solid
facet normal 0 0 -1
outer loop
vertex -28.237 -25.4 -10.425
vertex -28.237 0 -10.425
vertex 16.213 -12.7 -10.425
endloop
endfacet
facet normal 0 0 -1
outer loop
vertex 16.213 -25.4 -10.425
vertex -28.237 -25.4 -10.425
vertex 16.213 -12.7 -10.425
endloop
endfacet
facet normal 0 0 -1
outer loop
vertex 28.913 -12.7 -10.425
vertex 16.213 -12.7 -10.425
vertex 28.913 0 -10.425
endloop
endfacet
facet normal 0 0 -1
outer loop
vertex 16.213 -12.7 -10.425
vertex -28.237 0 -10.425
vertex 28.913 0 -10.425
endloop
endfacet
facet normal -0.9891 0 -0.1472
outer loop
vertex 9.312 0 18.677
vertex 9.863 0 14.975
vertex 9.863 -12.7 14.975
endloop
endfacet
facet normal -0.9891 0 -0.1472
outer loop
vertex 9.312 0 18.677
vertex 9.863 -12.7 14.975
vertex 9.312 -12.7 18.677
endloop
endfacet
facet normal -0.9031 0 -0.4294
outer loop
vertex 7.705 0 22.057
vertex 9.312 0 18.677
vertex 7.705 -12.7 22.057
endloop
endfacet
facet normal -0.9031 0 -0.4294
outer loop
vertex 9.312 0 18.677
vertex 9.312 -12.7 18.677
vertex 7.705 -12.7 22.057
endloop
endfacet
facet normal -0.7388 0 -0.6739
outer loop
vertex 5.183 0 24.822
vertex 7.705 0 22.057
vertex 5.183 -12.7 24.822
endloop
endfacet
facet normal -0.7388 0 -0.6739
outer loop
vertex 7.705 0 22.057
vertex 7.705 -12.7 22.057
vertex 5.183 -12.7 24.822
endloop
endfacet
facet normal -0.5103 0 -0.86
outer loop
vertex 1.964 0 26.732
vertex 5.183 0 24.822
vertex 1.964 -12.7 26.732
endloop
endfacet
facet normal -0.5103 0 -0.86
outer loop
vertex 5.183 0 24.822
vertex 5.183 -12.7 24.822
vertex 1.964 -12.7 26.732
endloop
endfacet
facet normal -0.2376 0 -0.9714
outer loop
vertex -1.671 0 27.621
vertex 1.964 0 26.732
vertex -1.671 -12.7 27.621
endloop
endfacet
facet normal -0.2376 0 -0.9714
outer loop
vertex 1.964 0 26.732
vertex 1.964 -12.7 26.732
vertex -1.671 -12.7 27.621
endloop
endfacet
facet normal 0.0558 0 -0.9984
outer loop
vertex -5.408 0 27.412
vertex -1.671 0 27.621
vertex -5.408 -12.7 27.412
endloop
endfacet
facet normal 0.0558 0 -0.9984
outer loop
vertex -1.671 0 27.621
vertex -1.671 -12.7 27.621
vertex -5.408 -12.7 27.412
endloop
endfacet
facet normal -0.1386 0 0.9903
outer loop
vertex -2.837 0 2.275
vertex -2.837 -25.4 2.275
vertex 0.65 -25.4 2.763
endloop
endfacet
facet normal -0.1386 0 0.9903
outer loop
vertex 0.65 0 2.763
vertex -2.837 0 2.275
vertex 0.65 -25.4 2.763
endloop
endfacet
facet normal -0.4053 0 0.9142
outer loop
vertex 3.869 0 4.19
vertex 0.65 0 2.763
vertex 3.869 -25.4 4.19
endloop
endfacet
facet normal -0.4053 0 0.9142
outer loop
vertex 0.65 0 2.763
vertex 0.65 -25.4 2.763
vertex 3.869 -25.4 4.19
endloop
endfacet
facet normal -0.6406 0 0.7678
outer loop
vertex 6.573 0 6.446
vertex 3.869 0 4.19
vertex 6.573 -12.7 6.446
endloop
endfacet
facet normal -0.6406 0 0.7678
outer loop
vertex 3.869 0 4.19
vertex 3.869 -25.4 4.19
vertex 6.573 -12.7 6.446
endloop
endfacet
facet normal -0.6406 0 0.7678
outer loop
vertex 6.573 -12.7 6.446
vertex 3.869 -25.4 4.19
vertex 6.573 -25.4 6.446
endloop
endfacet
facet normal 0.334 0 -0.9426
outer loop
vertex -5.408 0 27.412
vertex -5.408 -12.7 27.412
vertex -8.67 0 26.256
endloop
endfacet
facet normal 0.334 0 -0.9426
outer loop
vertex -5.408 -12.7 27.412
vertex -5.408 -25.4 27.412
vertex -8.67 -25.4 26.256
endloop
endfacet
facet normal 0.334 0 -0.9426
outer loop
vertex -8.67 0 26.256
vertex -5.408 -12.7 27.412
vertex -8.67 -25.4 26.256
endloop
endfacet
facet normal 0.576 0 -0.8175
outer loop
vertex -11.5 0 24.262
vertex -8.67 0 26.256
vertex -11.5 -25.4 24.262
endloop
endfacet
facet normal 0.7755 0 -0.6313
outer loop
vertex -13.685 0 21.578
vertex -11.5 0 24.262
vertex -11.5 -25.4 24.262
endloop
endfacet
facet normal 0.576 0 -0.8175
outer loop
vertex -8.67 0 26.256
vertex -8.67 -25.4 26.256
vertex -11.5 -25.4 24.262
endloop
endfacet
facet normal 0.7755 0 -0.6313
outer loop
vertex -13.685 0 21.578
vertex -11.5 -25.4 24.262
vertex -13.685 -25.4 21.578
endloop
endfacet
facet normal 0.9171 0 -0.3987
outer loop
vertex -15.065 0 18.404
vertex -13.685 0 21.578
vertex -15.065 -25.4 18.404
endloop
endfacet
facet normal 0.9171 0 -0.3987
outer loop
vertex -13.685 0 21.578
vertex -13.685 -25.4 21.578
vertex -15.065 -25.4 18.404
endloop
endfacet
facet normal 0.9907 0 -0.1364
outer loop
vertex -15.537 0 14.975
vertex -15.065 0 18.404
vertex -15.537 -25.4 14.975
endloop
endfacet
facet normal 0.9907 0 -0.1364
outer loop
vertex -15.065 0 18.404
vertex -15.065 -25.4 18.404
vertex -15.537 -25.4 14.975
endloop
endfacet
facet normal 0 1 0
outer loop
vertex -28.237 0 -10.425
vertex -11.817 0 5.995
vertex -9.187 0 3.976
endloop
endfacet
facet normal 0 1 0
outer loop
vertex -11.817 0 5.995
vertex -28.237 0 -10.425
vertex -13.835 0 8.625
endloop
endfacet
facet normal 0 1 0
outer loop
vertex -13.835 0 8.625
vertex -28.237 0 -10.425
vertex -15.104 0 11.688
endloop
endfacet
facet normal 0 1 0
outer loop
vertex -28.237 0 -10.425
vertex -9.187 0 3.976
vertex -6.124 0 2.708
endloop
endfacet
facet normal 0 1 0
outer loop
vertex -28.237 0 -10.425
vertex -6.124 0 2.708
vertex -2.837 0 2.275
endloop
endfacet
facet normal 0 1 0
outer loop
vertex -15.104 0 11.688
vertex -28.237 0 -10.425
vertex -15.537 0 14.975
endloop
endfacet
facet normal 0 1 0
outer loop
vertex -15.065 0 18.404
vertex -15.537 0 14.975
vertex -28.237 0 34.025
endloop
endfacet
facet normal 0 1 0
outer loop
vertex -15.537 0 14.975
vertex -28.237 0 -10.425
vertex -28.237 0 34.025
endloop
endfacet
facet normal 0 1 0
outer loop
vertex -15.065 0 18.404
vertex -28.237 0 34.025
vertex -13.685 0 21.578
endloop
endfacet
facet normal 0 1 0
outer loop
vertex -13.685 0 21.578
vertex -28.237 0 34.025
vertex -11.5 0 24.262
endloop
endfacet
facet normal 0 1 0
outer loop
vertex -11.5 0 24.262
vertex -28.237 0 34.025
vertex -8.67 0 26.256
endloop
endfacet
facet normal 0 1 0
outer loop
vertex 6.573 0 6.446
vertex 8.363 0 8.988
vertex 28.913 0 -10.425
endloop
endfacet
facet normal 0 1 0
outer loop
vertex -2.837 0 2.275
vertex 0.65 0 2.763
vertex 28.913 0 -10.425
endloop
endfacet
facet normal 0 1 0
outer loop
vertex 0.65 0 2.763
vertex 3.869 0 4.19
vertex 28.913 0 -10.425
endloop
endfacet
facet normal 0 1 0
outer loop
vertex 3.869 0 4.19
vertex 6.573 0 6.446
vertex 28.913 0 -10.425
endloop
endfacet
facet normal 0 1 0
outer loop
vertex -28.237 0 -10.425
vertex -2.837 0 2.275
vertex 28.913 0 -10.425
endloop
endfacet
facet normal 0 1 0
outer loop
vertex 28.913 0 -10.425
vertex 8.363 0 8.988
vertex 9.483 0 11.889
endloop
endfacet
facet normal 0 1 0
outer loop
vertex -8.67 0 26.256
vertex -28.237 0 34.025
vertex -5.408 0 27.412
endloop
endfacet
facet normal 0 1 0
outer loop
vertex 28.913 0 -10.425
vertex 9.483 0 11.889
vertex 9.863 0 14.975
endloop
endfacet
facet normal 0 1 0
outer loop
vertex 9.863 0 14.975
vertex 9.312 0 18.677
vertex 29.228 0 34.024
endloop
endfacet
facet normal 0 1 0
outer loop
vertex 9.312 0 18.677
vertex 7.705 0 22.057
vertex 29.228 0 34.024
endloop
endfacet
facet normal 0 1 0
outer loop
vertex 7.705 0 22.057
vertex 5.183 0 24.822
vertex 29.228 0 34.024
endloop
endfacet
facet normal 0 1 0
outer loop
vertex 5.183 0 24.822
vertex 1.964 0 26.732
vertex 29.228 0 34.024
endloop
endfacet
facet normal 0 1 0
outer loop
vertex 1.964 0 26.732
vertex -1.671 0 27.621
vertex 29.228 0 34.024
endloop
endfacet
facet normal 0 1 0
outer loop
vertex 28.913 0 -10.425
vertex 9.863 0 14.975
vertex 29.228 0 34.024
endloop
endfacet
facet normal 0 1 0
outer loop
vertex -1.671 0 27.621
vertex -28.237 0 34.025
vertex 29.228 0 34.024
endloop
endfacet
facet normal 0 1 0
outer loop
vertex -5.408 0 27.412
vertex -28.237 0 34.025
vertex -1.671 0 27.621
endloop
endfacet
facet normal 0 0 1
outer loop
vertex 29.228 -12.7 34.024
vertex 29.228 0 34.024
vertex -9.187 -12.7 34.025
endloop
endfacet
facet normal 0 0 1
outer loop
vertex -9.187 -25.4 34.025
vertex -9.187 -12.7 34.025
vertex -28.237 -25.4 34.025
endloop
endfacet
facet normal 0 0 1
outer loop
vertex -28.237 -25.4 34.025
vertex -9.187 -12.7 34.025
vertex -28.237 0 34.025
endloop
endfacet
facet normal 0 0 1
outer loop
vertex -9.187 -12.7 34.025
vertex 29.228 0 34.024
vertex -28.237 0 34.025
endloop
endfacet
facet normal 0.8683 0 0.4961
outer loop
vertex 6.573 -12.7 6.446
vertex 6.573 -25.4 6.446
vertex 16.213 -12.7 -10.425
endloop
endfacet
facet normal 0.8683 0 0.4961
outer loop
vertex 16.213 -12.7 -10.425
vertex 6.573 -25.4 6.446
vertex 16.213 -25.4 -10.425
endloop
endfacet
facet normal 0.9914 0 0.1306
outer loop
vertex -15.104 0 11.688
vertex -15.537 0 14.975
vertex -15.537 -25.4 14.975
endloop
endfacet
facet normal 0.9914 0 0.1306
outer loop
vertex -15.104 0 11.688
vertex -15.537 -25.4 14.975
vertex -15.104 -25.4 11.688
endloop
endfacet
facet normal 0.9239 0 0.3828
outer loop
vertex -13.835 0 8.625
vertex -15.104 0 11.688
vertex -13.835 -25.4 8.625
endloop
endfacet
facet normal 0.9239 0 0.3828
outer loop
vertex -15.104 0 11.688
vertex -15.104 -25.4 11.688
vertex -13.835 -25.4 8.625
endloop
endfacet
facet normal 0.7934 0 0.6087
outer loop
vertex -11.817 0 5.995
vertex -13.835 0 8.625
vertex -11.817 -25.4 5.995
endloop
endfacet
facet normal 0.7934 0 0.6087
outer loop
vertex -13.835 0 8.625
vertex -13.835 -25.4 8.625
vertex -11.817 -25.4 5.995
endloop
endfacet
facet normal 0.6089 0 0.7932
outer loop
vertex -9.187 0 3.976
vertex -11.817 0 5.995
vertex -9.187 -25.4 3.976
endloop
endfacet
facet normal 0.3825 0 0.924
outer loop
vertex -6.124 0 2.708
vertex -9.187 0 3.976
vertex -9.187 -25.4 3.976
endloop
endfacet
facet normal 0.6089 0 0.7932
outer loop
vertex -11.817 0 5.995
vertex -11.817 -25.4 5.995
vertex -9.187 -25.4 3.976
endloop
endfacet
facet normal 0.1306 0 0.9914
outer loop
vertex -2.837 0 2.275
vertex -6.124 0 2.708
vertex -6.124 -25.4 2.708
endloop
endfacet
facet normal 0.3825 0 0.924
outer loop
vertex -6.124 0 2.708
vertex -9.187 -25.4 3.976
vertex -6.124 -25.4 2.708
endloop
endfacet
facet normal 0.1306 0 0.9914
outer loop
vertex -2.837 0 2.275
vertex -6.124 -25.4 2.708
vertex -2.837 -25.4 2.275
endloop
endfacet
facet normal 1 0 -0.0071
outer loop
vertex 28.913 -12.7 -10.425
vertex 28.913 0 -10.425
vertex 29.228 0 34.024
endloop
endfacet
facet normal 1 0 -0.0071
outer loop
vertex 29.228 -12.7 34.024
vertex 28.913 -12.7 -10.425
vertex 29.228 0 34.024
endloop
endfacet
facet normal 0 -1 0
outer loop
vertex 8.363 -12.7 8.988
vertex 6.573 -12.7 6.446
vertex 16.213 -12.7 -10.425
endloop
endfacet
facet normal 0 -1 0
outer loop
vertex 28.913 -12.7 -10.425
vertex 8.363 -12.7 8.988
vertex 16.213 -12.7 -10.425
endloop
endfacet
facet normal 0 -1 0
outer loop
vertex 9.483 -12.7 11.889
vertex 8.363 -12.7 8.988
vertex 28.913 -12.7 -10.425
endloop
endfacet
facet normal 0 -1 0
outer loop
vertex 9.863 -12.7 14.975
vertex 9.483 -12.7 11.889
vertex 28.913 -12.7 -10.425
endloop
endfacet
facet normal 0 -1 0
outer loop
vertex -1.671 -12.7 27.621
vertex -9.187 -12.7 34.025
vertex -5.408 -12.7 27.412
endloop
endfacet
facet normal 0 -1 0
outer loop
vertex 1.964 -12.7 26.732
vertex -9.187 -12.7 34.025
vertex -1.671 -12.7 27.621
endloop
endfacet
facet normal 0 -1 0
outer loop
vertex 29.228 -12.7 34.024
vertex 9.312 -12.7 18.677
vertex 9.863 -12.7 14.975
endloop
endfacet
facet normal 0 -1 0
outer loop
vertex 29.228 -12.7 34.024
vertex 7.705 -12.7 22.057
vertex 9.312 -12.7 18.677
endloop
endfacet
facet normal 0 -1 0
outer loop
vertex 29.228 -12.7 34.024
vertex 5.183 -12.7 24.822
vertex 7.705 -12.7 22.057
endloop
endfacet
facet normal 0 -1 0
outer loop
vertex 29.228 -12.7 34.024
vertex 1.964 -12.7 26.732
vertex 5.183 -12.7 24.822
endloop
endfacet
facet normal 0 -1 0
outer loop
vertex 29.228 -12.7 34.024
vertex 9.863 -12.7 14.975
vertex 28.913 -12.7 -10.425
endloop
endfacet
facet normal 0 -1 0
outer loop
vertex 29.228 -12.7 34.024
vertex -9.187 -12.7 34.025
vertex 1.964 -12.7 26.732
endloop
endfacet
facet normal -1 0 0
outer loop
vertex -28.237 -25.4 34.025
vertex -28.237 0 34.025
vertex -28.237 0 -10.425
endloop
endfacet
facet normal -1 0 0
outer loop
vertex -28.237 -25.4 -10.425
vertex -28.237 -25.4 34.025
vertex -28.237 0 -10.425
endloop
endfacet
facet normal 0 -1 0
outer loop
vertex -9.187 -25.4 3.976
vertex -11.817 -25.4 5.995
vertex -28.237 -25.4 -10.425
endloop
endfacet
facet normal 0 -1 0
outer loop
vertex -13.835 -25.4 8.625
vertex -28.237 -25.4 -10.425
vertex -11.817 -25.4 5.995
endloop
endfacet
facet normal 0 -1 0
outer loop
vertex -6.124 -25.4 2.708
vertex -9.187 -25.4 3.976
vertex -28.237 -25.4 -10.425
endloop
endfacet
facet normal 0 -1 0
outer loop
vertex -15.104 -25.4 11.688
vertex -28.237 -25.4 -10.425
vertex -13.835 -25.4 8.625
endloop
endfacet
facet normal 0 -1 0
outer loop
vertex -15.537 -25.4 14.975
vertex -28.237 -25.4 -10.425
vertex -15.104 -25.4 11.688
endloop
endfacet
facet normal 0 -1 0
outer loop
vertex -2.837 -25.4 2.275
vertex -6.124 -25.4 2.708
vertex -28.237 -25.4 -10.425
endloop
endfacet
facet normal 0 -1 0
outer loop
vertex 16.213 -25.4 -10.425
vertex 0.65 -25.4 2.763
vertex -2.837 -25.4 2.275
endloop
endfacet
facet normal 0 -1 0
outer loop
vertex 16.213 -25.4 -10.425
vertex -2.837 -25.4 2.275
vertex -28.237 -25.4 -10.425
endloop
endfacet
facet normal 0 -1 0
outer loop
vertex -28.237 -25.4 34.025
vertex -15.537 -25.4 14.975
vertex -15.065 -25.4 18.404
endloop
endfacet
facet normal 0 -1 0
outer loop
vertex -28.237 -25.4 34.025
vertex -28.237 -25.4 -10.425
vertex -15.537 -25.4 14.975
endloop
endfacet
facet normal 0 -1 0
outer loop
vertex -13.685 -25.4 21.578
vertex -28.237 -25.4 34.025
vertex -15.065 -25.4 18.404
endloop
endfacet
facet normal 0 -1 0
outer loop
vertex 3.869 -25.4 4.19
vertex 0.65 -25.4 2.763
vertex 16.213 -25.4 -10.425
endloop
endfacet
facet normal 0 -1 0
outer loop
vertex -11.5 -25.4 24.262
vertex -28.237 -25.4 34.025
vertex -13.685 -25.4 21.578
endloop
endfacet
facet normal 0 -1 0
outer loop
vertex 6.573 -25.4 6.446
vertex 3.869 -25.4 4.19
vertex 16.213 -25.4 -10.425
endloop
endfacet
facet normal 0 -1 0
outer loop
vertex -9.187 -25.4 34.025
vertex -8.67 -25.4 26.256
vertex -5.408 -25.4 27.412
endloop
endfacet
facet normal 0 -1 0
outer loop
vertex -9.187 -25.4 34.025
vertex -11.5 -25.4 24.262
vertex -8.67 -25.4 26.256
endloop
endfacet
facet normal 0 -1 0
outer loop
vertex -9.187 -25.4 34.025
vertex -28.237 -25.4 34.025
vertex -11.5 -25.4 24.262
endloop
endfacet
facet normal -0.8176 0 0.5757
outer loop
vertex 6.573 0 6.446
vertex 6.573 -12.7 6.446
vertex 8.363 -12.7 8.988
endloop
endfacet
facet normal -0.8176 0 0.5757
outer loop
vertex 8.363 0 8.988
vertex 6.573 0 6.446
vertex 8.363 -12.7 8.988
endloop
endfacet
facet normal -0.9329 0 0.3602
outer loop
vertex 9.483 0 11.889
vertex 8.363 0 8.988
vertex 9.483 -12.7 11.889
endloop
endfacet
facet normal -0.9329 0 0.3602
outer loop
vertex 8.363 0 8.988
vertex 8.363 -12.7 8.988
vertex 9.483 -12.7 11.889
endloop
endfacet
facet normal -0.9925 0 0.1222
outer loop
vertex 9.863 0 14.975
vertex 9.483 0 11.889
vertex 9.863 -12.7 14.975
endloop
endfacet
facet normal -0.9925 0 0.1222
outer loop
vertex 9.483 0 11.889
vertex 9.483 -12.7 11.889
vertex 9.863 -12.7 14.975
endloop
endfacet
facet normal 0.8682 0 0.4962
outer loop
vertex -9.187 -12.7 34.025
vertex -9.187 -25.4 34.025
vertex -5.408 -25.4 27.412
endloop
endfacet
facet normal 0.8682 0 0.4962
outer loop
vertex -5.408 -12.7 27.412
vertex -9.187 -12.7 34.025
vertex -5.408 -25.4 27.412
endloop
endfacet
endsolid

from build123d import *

# Parameters (mm, degrees)
F1_DEPTH = 25.4
F3_DEPTH = 12.7
F5_DEPTH = 25.401


with BuildPart() as f1:
    # F0 (on Front) → F1 (new body)
    with BuildSketch(Plane.XZ):
        Polygon((29.228445, 34.023839), (-28.236794, 34.024957), (-28.236794, -10.425043), (28.913206, -10.425043), align=None)
    extrude(amount=F1_DEPTH)

    # F2 (on face) → F3 (cut)
    with BuildSketch(Plane.XZ.offset(25.4)):
        Polygon((29.228445, 34.023839), (-9.186794, 34.024587), (16.213206, -10.425043), (28.913206, -10.425043), align=None)
    extrude(amount=-F3_DEPTH, mode=Mode.SUBTRACT)

    # F4 (on face) → F5 (cut, through all)
    with BuildSketch(Plane.XZ.offset(25.4)):
        with BuildLine():
            Line((-2.836794, 14.974957), (-15.536794, 14.974957))
            ThreePointArc((-15.536794, 14.974957), (-11.81705, 5.994701), (-2.836794, 2.274957))
            Line((-2.836794, 2.274957), (-2.836794, 14.974957))
        make_face()
        with BuildLine():
            Line((6.572767, 6.445586), (-5.408103, 27.411933))
            ThreePointArc((-5.408103, 27.411933), (-12.684271, 22.994757), (-15.536794, 14.974957))
            Line((-15.536794, 14.974957), (-2.836794, 14.974957))
            Line((-2.836794, 14.974957), (-2.836794, 2.274957))
            ThreePointArc((-2.836794, 2.274957), (2.309418, 3.364337), (6.572767, 6.445586))
        make_face()
        with BuildLine():
            ThreePointArc((6.572767, 6.445586), (9.012076, 10.40393), (9.863206, 14.974957))
            ThreePointArc((9.863206, 14.974957), (5.183006, 24.822435), (-5.408103, 27.411933))
            Line((-5.408103, 27.411933), (6.572767, 6.445586))
        make_face()
    extrude(amount=-F5_DEPTH, mode=Mode.SUBTRACT)


solid = f1.part
